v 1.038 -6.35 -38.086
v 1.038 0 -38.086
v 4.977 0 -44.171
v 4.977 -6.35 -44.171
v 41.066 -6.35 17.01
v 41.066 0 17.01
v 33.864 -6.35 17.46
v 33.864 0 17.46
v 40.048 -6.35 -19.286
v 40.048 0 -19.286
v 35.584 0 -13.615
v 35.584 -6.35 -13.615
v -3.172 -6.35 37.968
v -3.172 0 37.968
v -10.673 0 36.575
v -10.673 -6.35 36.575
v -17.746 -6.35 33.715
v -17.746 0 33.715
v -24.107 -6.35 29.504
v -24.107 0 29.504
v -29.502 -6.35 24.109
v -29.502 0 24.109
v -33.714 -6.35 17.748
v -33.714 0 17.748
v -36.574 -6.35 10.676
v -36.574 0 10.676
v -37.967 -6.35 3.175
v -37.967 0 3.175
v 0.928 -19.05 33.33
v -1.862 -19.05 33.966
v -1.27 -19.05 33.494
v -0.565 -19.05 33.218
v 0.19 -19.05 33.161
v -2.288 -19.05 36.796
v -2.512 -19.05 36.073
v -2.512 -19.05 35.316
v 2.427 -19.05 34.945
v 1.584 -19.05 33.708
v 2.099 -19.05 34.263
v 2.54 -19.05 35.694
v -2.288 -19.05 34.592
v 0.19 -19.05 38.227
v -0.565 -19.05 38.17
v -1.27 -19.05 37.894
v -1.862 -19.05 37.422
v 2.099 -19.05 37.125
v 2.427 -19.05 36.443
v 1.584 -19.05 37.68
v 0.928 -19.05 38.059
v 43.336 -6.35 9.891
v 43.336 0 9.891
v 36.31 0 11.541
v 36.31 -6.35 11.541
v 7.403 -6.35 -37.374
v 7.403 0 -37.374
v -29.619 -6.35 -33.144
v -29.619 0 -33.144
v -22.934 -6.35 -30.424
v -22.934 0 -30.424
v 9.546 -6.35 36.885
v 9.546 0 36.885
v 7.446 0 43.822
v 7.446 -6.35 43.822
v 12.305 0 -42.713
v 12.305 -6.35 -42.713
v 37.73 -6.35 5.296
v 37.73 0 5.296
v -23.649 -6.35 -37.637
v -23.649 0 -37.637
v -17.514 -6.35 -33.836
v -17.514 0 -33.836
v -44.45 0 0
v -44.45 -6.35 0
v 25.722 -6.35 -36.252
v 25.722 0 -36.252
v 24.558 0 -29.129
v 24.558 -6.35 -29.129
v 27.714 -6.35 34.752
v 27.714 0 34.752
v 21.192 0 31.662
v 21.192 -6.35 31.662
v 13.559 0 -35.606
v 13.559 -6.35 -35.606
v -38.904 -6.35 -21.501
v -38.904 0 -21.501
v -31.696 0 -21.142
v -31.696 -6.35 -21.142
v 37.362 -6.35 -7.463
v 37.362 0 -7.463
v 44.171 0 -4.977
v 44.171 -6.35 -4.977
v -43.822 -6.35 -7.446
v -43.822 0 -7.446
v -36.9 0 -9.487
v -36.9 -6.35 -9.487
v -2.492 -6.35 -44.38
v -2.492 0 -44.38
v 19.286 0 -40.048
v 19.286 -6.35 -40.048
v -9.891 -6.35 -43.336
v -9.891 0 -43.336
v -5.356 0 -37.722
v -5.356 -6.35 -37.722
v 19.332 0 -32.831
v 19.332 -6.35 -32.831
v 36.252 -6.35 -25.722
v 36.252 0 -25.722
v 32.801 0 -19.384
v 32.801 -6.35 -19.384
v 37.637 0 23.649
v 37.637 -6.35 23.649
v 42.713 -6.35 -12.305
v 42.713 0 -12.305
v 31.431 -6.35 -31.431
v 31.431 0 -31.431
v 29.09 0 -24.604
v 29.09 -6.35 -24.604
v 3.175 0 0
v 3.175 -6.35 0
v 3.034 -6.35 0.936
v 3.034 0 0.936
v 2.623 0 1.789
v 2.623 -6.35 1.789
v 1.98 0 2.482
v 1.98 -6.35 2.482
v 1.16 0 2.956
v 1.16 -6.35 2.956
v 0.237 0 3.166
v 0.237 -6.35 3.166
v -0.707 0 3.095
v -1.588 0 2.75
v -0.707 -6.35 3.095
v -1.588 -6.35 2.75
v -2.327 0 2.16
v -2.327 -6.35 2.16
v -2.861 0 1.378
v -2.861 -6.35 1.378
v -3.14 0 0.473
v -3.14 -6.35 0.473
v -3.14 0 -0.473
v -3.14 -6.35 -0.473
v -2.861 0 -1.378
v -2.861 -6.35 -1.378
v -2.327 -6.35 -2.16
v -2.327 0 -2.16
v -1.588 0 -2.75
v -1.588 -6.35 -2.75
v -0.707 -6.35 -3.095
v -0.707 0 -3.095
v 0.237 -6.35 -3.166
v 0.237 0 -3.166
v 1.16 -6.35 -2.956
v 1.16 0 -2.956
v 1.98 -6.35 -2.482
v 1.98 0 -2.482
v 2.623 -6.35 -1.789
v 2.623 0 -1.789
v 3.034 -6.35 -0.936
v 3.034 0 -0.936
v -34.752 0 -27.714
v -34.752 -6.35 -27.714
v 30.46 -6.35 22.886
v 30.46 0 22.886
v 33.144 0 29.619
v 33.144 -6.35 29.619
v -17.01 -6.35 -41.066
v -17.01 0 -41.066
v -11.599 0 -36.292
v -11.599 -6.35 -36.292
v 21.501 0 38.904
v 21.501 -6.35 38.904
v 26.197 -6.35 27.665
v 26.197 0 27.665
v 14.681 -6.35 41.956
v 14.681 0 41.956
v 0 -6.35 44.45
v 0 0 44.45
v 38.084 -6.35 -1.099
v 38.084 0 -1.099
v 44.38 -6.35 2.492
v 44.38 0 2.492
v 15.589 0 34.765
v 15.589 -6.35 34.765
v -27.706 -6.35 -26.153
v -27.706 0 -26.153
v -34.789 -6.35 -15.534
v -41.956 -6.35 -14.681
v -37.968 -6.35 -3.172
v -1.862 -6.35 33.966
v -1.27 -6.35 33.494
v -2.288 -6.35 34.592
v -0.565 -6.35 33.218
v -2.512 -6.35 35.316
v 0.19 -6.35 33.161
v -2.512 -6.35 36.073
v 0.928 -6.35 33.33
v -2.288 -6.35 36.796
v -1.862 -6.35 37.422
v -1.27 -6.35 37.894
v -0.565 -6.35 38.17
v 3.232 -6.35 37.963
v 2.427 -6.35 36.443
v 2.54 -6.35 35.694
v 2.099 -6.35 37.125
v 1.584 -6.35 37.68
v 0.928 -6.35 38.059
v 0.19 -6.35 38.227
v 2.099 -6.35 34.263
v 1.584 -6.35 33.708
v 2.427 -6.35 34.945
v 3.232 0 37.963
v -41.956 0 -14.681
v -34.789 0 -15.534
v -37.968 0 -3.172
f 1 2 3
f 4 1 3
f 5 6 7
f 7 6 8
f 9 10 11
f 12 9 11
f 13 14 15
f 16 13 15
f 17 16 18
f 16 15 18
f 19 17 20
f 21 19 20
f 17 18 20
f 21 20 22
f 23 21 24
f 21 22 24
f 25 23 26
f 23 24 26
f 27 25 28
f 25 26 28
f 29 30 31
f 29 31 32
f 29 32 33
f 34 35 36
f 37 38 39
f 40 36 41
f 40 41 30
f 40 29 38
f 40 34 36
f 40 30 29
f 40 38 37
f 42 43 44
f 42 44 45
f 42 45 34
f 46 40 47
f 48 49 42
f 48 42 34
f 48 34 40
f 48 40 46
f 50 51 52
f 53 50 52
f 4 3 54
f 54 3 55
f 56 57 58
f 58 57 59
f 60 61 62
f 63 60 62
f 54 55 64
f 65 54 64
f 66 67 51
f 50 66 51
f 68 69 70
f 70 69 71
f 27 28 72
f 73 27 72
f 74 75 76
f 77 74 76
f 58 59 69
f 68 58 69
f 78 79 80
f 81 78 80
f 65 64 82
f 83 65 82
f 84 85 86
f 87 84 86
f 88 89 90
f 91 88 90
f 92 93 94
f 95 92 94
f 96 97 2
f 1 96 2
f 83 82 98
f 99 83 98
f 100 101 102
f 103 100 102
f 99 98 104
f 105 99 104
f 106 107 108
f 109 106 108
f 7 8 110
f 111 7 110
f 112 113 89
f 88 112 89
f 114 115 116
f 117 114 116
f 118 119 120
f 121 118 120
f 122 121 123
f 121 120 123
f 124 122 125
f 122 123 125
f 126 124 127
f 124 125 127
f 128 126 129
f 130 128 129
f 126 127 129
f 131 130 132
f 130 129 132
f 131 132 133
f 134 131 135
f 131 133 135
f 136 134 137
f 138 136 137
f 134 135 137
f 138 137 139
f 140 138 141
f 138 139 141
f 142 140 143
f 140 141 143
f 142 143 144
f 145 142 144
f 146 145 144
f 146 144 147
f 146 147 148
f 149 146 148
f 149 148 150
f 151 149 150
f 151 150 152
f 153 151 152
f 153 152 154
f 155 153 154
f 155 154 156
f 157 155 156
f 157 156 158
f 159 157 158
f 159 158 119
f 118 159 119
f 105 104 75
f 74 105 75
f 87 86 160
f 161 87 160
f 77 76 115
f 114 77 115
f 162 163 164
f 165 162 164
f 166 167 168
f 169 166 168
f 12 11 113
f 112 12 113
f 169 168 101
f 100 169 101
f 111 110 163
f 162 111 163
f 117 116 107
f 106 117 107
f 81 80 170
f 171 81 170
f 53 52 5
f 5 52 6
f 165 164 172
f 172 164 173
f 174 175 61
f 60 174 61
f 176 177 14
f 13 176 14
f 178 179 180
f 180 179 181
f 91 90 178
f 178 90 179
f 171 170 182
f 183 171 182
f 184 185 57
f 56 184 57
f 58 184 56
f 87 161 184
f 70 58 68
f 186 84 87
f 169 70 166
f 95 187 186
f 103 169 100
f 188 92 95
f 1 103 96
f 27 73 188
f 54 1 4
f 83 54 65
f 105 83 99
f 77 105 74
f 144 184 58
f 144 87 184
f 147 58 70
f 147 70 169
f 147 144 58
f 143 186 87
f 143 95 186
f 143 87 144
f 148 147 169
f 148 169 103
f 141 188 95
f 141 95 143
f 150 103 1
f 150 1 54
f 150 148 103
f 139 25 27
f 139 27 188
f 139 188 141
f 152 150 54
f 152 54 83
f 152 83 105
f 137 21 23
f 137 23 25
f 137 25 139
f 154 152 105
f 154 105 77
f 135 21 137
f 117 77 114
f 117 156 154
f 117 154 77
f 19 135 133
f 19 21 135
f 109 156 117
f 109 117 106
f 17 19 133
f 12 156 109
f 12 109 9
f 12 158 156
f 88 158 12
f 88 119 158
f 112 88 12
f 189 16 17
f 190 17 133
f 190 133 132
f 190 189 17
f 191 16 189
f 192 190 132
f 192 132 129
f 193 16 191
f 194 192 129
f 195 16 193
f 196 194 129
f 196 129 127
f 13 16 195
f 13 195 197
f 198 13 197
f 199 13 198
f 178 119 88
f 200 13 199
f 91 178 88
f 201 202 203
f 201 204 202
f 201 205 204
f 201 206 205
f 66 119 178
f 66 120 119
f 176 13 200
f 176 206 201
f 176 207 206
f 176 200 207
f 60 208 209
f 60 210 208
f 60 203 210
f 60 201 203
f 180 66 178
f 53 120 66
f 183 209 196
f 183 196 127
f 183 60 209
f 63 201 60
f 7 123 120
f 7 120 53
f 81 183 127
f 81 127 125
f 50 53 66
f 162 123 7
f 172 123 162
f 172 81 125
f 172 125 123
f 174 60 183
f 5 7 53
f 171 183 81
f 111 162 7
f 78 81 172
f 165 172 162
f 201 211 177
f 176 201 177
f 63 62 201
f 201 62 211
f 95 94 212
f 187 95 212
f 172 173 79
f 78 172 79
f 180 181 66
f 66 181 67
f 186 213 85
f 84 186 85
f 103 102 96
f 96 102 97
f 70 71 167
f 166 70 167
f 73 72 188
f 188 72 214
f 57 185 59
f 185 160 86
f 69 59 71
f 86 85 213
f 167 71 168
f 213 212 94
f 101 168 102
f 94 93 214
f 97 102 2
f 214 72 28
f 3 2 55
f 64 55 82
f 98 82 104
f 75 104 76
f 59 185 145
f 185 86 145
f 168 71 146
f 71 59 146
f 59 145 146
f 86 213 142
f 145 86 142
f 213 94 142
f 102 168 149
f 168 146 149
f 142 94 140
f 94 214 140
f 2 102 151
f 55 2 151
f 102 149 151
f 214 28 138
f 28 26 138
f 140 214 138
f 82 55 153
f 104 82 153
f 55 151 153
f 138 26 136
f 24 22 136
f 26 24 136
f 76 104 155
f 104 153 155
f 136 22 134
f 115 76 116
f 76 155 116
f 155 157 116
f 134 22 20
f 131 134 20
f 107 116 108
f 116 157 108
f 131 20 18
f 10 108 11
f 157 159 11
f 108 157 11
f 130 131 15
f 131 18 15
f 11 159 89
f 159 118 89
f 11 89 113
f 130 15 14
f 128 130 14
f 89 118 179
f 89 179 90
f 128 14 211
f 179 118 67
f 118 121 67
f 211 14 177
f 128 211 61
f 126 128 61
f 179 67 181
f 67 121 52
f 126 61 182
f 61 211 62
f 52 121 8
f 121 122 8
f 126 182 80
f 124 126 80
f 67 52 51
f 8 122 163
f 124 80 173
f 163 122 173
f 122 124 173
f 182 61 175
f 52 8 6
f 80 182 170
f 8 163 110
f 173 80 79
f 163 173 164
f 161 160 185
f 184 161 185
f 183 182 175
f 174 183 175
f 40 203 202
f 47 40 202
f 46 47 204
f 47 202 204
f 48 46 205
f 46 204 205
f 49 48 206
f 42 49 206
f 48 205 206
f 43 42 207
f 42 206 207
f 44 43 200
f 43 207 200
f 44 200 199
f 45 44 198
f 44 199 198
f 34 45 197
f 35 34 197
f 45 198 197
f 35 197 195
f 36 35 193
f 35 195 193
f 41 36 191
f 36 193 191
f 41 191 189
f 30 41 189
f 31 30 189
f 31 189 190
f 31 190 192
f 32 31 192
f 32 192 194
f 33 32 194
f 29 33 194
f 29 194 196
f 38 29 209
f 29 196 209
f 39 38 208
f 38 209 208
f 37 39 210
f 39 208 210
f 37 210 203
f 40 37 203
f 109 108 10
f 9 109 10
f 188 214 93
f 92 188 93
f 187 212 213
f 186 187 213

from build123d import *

# Parameters (mm, degrees)
F1_DEPTH = 6.35
F2_R     = 3.175
F3_DEPTH = 25.4
F4_R     = 2.54
F5_DEPTH = 12.7


with BuildPart() as f1:
    # F0 (on Front) → F1 (new body)
    with BuildSketch(Plane.XZ):
        with BuildLine():
            ThreePointArc((38.0841538474, -1.0987382425), (38.0960382559, -0.5494262521), (38.1, 0))
            ThreePointArc((38.1, 0), (38.0850124652, 1.0685623641), (38.0400616522, 2.1362840397))
            Line((38.0400616522, 2.1362840397), (0, 0))
            Line((0, 0), (37.8604351969, -4.2658465395))
            ThreePointArc((37.8604351969, -4.2658465395), (38.0052995649, -2.6846238059), (38.0841538474, -1.0987382425))
        make_face()
        with BuildLine():
            ThreePointArc((38.0400616522, 2.1362840397), (38.0850124652, 1.0685623641), (38.1, 0))
            ThreePointArc((38.1, 0), (38.0960382559, -0.5494262521), (38.0841538474, -1.0987382425))
            Line((38.0841538474, -1.0987382425), (44.3800719275, 2.4923313797))
            Line((44.3800719275, 2.4923313797), (38.0400616522, 2.1362840397))
        make_face()
        with BuildLine():
            Line((0, 0), (38.0400616522, 2.1362840397))
            ThreePointArc((38.0400616522, 2.1362840397), (37.9180145859, 3.7194313898), (37.7301090364, 5.2961185886))
            ThreePointArc((37.7301090364, 5.2961185886), (37.4712213075, 6.8932991902), (37.1447534541, 8.4780475837))
            Line((37.1447534541, 8.4780475837), (0, 0))
        make_face()
        with BuildLine():
            ThreePointArc((37.7301090364, 5.2961185886), (37.9180145859, 3.7194313898), (38.0400616522, 2.1362840397))
            Line((38.0400616522, 2.1362840397), (44.3800719275, 2.4923313797))
            Line((44.3800719275, 2.4923313797), (37.7301090364, 5.2961185886))
        make_face()
        with BuildLine():
            Line((44.1705077298, -4.9768209628), (38.0841538474, -1.0987382425))
            ThreePointArc((38.0841538474, -1.0987382425), (38.0052995649, -2.6846238059), (37.8604351969, -4.2658465395))
            Line((37.8604351969, -4.2658465395), (44.1705077298, -4.9768209628))
        make_face()
        with BuildLine():
            ThreePointArc((37.1447534541, 8.4780475837), (37.4712213075, 6.8932991902), (37.7301090364, 5.2961185886))
            Line((37.7301090364, 5.2961185886), (43.3355456965, 9.8910555144))
            Line((43.3355456965, 9.8910555144), (37.1447534541, 8.4780475837))
        make_face()
        with BuildLine():
            Line((-37.5616858055, -6.3819871079), (0, 0))
            Line((0, 0), (6.3819871079, 37.5616858055))
            ThreePointArc((6.3819871079, 37.5616858055), (4.8113745401, 37.794982141), (3.2324052628, 37.9626336839))
            ThreePointArc((3.2324052628, 37.9626336839), (1.6176613743, 38.06564293), (0, 38.1))
            ThreePointArc((0, 38.1), (-1.5875, 38.0669127163), (-3.1722427264, 37.9677083333))
            ThreePointArc((-3.1722427264, 37.9677083333), (-26.9397901024, 26.9417465885), (-37.9674778593, 3.175))
            ThreePointArc((-37.9674778593, 3.175), (-38.0668550477, 1.5888822422), (-38.1, 0))
            ThreePointArc((-38.1, 0), (-38.0669127163, -1.5875), (-37.9677083333, -3.1722427264))
            ThreePointArc((-37.9677083333, -3.1722427264), (-37.7987825134, -4.7814266182), (-37.5616858055, -6.3819871079))
        make_face()
        with BuildLine():
            Line((6.3819871079, 37.5616858055), (0, 0))
            Line((0, 0), (12.5836322605, 35.9619548847))
            ThreePointArc((12.5836322605, 35.9619548847), (11.0742894366, 36.4550423601), (9.5457120638, 36.8848123378))
            ThreePointArc((9.5457120638, 36.8848123378), (7.9710375516, 37.2568458186), (6.3819871079, 37.5616858055))
        make_face()
        with BuildLine():
            Line((12.5836322605, 35.9619548847), (0, 0))
            Line((0, 0), (18.4296895987, 33.3460123747))
            ThreePointArc((18.4296895987, 33.3460123747), (17.0242674724, 34.0849573423), (15.5892764868, 34.7647013308))
            ThreePointArc((15.5892764868, 34.7647013308), (14.099168445, 35.3952461379), (12.5836322605, 35.9619548847))
        make_face()
        with BuildLine():
            Line((18.4296895987, 33.3460123747), (0, 0))
            Line((0, 0), (23.7549614508, 29.787779482))
            ThreePointArc((23.7549614508, 29.787779482), (22.4931743884, 30.7517008624), (21.1923197123, 31.6622106811))
            ThreePointArc((21.1923197123, 31.6622106811), (19.8288855586, 32.5334489027), (18.4296895987, 33.3460123747))
        make_face()
        with BuildLine():
            Line((23.7549614508, 29.787779482), (0, 0))
            Line((0, 0), (28.408966482, 25.38780462))
            ThreePointArc((28.408966482, 25.38780462), (27.3264700157, 26.5494639585), (26.1965111522, 27.6650104546))
            ThreePointArc((26.1965111522, 27.6650104546), (24.9982787585, 28.7523226733), (23.7549614508, 29.787779482))
        make_face()
        with BuildLine():
            Line((28.408966482, 25.38780462), (0, 0))
            Line((0, 0), (32.2601919906, 20.2704221152))
            ThreePointArc((32.2601919906, 20.2704221152), (31.3875752653, 21.5969932853), (30.4604425502, 22.8860533873))
            ThreePointArc((30.4604425502, 22.8860533873), (29.4612715231, 24.1587143748), (28.408966482, 25.38780462))
        make_face()
        with BuildLine():
            Line((32.2601919906, 20.2704221152), (0, 0))
            Line((0, 0), (35.1998101887, 14.5802387731))
            ThreePointArc((35.1998101887, 14.5802387731), (34.5617315756, 16.0342355757), (33.8636238907, 17.4603830711))
            ThreePointArc((33.8636238907, 17.4603830711), (33.0917487681, 18.8824300202), (32.2601919906, 20.2704221152))
        make_face()
        with BuildLine():
            Line((35.1998101887, 14.5802387731), (0, 0))
            Line((0, 0), (37.1447534541, 8.4780475837))
            ThreePointArc((37.1447534541, 8.4780475837), (36.759243755, 10.0183830311), (36.3098882015, 11.5413178967))
            ThreePointArc((36.3098882015, 11.5413178967), (35.7871206021, 13.0725666574), (35.1998101887, 14.5802387731))
        make_face()
        with BuildLine():
            Line((37.8604351969, -4.2658465395), (0, 0))
            Line((0, 0), (36.6109499661, -10.5474329853))
            ThreePointArc((36.6109499661, -10.5474329853), (37.0186321964, -9.0128170016), (37.3620180496, -7.4625469689))
            ThreePointArc((37.3620180496, -7.4625469689), (37.6451735487, -5.8694896273), (37.8604351969, -4.2658465395))
        make_face()
        with BuildLine():
            Line((36.6109499661, -10.5474329853), (0, 0))
            Line((0, 0), (34.3269138671, -16.5309704604))
            ThreePointArc((34.3269138671, -16.5309704604), (34.9858936904, -15.0863263482), (35.5841077294, -13.6154793195))
            ThreePointArc((35.5841077294, -13.6154793195), (36.1301095486, -12.0923605639), (36.6109499661, -10.5474329853))
        make_face()
        with BuildLine():
            Line((34.3269138671, -16.5309704604), (0, 0))
            Line((0, 0), (31.0728691073, -22.0473763845))
            ThreePointArc((31.0728691073, -22.0473763845), (31.9645250962, -20.7335268436), (32.800663011, -19.3836659598))
            ThreePointArc((32.800663011, -19.3836659598), (33.5940822509, -17.9735260235), (34.3269138671, -16.5309704604))
        make_face()
        with BuildLine():
            Line((31.0728691073, -22.0473763845), (0, 0))
            Line((0, 0), (26.9407683632, -26.9407683632))
            ThreePointArc((26.9407683632, -26.9407683632), (28.0399041357, -25.7948401054), (29.090338372, -24.6041096852))
            ThreePointArc((29.090338372, -24.6041096852), (30.1087546213, -23.3467962504), (31.0728691073, -22.0473763845))
        make_face()
        with BuildLine():
            Line((26.9407683632, -26.9407683632), (0, 0))
            Line((0, 0), (22.0473763845, -31.0728691073))
            ThreePointArc((22.0473763845, -31.0728691073), (23.3229326026, -30.1272437308), (24.5579800287, -29.1292913905))
            ThreePointArc((24.5579800287, -29.1292913905), (25.7726149186, -28.0603335735), (26.9407683632, -26.9407683632))
        make_face()
        with BuildLine():
            Line((22.0473763845, -31.0728691073), (0, 0))
            Line((0, 0), (16.5309704604, -34.3269138671))
            ThreePointArc((16.5309704604, -34.3269138671), (17.9469025038, -33.6083128187), (19.3316631953, -32.8313386584))
            ThreePointArc((19.3316631953, -32.8313386584), (20.7081936181, -31.9809430298), (22.0473763845, -31.0728691073))
        make_face()
        with BuildLine():
            Line((16.5309704604, -34.3269138671), (0, 0))
            Line((0, 0), (10.5474329853, -36.6109499661))
            ThreePointArc((10.5474329853, -36.6109499661), (12.0637294988, -36.1396794477), (13.5590729393, -35.6056391745))
            ThreePointArc((13.5590729393, -35.6056391745), (15.0586009493, -34.9978361824), (16.5309704604, -34.3269138671))
        make_face()
        with BuildLine():
            Line((10.5474329853, -36.6109499661), (0, 0))
            Line((0, 0), (4.2658465395, -37.8604351969))
            ThreePointArc((4.2658465395, -37.8604351969), (5.8396600724, -37.6498123533), (7.4033309023, -37.3737968576))
            ThreePointArc((7.4033309023, -37.3737968576), (8.9834828926, -37.0257617763), (10.5474329853, -36.6109499661))
        make_face()
        with BuildLine():
            Line((4.2658465395, -37.8604351969), (0, 0))
            Line((0, 0), (-2.1362840397, -38.0400616522))
            ThreePointArc((-2.1362840397, -38.0400616522), (-0.5494262521, -38.0960382559), (1.0383858149, -38.0858471732))
            ThreePointArc((1.0383858149, -38.0858471732), (2.6545099091, -38.0074147653), (4.2658465395, -37.8604351969))
        make_face()
        with BuildLine():
            Line((-2.1362840397, -38.0400616522), (0, 0))
            Line((0, 0), (-8.4780475837, -37.1447534541))
            ThreePointArc((-8.4780475837, -37.1447534541), (-6.9229869099, -37.4657477204), (-5.3559019404, -37.72166903))
            ThreePointArc((-5.3559019404, -37.72166903), (-3.7494741172, -37.9150556355), (-2.1362840397, -38.0400616522))
        make_face()
        with BuildLine():
            Line((-8.4780475837, -37.1447534541), (0, 0))
            Line((0, 0), (-14.5802387731, -35.1998101887))
            ThreePointArc((-14.5802387731, -35.1998101887), (-13.10091806, -35.7767514734), (-11.598842817, -36.2915533603))
            ThreePointArc((-11.598842817, -36.2915533603), (-10.0475056427, -36.7512942678), (-8.4780475837, -37.1447534541))
        make_face()
        with BuildLine():
            Line((-14.5802387731, -35.1998101887), (0, 0))
            Line((0, 0), (-20.2704221152, -32.2601919906))
            ThreePointArc((-20.2704221152, -32.2601919906), (-18.9086439527, -33.0767771083), (-17.5140240229, -33.83591232))
            ThreePointArc((-17.5140240229, -33.83591232), (-16.0616151259, -34.5490161878), (-14.5802387731, -35.1998101887))
        make_face()
        with BuildLine():
            Line((-20.2704221152, -32.2601919906), (0, 0))
            Line((0, 0), (-25.38780462, -28.408966482))
            ThreePointArc((-25.38780462, -28.408966482), (-24.1820500849, -29.4421204007), (-22.9342945866, -30.4241373225))
            ThreePointArc((-22.9342945866, -30.4241373225), (-21.6218560838, -31.370453288), (-20.2704221152, -32.2601919906))
        make_face()
        with BuildLine():
            Line((-25.38780462, -28.408966482), (0, 0))
            Line((0, 0), (-29.787779482, -23.7549614508))
            ThreePointArc((-29.787779482, -23.7549614508), (-28.7721207415, -24.9754893453), (-27.7064887033, -26.1526381793))
            ThreePointArc((-27.7064887033, -26.1526381793), (-26.5711074332, -27.305425281), (-25.38780462, -28.408966482))
        make_face()
        with BuildLine():
            Line((-29.787779482, -23.7549614508), (0, 0))
            Line((0, 0), (-33.3460123747, -18.4296895987))
            ThreePointArc((-33.3460123747, -18.4296895987), (-32.5491498758, -19.8031018369), (-31.6957538883, -21.142118755))
            ThreePointArc((-31.6957538883, -21.142118755), (-30.7695134129, -22.4688015777), (-29.787779482, -23.7549614508))
        make_face()
        with BuildLine():
            Line((-33.3460123747, -18.4296895987), (0, 0))
            Line((0, 0), (-35.9619548847, -12.5836322605))
            ThreePointArc((-35.9619548847, -12.5836322605), (-35.4064063384, -14.0711190103), (-34.7893616339, -15.534166122))
            ThreePointArc((-34.7893616339, -15.534166122), (-34.0984356221, -16.9972553115), (-33.3460123747, -18.4296895987))
        make_face()
        with BuildLine():
            Line((-35.9619548847, -12.5836322605), (0, 0))
            Line((0, 0), (-37.5616858055, -6.3819871079))
            ThreePointArc((-37.5616858055, -6.3819871079), (-37.263149882, -7.9415150239), (-36.8998928869, -9.4872495981))
            ThreePointArc((-36.8998928869, -9.4872495981), (-36.4638055004, -11.0454012343), (-35.9619548847, -12.5836322605))
        make_face()
        with BuildLine():
            Line((44.1705077298, -4.9768209628), (37.8604351969, -4.2658465395))
            ThreePointArc((37.8604351969, -4.2658465395), (37.6451735487, -5.8694896273), (37.3620180496, -7.4625469689))
            Line((37.3620180496, -7.4625469689), (44.1705077298, -4.9768209628))
        make_face()
        with BuildLine():
            ThreePointArc((36.3098882015, 11.5413178967), (36.759243755, 10.0183830311), (37.1447534541, 8.4780475837))
            Line((37.1447534541, 8.4780475837), (43.3355456965, 9.8910555144))
            Line((43.3355456965, 9.8910555144), (36.3098882015, 11.5413178967))
        make_face()
        with BuildLine():
            Line((7.4456516259, 43.8219667731), (6.3819871079, 37.5616858055))
            ThreePointArc((6.3819871079, 37.5616858055), (7.9710375516, 37.2568458186), (9.5457120638, 36.8848123378))
            Line((9.5457120638, 36.8848123378), (7.4456516259, 43.8219667731))
        make_face()
        with BuildLine():
            ThreePointArc((3.2324052628, 37.9626336839), (4.8113745401, 37.794982141), (6.3819871079, 37.5616858055))
            Line((6.3819871079, 37.5616858055), (7.4456516259, 43.8219667731))
            Line((7.4456516259, 43.8219667731), (3.2324052628, 37.9626336839))
        make_face()
        with BuildLine():
            Line((14.6809043039, 41.9556140322), (12.5836322605, 35.9619548847))
            ThreePointArc((12.5836322605, 35.9619548847), (14.099168445, 35.3952461379), (15.5892764868, 34.7647013308))
            Line((15.5892764868, 34.7647013308), (14.6809043039, 41.9556140322))
        make_face()
        with BuildLine():
            ThreePointArc((9.5457120638, 36.8848123378), (11.0742894366, 36.4550423601), (12.5836322605, 35.9619548847))
            Line((12.5836322605, 35.9619548847), (14.6809043039, 41.9556140322))
            Line((14.6809043039, 41.9556140322), (9.5457120638, 36.8848123378))
        make_face()
        with BuildLine():
            Line((21.5013045318, 38.9036811038), (18.4296895987, 33.3460123747))
            ThreePointArc((18.4296895987, 33.3460123747), (19.8288855586, 32.5334489027), (21.1923197123, 31.6622106811))
            Line((21.1923197123, 31.6622106811), (21.5013045318, 38.9036811038))
        make_face()
        with BuildLine():
            ThreePointArc((15.5892764868, 34.7647013308), (17.0242674724, 34.0849573423), (18.4296895987, 33.3460123747))
            Line((18.4296895987, 33.3460123747), (21.5013045318, 38.9036811038))
            Line((21.5013045318, 38.9036811038), (15.5892764868, 34.7647013308))
        make_face()
        with BuildLine():
            Line((27.7141216926, 34.7524093957), (23.7549614508, 29.787779482))
            ThreePointArc((23.7549614508, 29.787779482), (24.9982787585, 28.7523226733), (26.1965111522, 27.6650104546))
            Line((26.1965111522, 27.6650104546), (27.7141216926, 34.7524093957))
        make_face()
        with BuildLine():
            ThreePointArc((21.1923197123, 31.6622106811), (22.4931743884, 30.7517008624), (23.7549614508, 29.787779482))
            Line((23.7549614508, 29.787779482), (27.7141216926, 34.7524093957))
            Line((27.7141216926, 34.7524093957), (21.1923197123, 31.6622106811))
        make_face()
        with BuildLine():
            Line((33.1437942291, 29.61910539), (28.408966482, 25.38780462))
            ThreePointArc((28.408966482, 25.38780462), (29.4612715231, 24.1587143748), (30.4604425502, 22.8860533873))
            Line((30.4604425502, 22.8860533873), (33.1437942291, 29.61910539))
        make_face()
        with BuildLine():
            ThreePointArc((26.1965111522, 27.6650104546), (27.3264700157, 26.5494639585), (28.408966482, 25.38780462))
            Line((28.408966482, 25.38780462), (33.1437942291, 29.61910539))
            Line((33.1437942291, 29.61910539), (26.1965111522, 27.6650104546))
        make_face()
        with BuildLine():
            Line((37.6368906557, 23.6488258011), (32.2601919906, 20.2704221152))
            ThreePointArc((32.2601919906, 20.2704221152), (33.0917487681, 18.8824300202), (33.8636238907, 17.4603830711))
            Line((33.8636238907, 17.4603830711), (37.6368906557, 23.6488258011))
        make_face()
        with BuildLine():
            ThreePointArc((30.4604425502, 22.8860533873), (31.3875752653, 21.5969932853), (32.2601919906, 20.2704221152))
            Line((32.2601919906, 20.2704221152), (37.6368906557, 23.6488258011))
            Line((37.6368906557, 23.6488258011), (30.4604425502, 22.8860533873))
        make_face()
        with BuildLine():
            Line((41.0664452201, 17.0102785686), (35.1998101887, 14.5802387731))
            ThreePointArc((35.1998101887, 14.5802387731), (35.7871206021, 13.0725666574), (36.3098882015, 11.5413178967))
            Line((36.3098882015, 11.5413178967), (41.0664452201, 17.0102785686))
        make_face()
        with BuildLine():
            ThreePointArc((33.8636238907, 17.4603830711), (34.5617315756, 16.0342355757), (35.1998101887, 14.5802387731))
            Line((35.1998101887, 14.5802387731), (41.0664452201, 17.0102785686))
            Line((41.0664452201, 17.0102785686), (33.8636238907, 17.4603830711))
        make_face()
        with BuildLine():
            Line((42.7127749605, -12.3053384828), (36.6109499661, -10.5474329853))
            ThreePointArc((36.6109499661, -10.5474329853), (36.1301095486, -12.0923605639), (35.5841077294, -13.6154793195))
            Line((35.5841077294, -13.6154793195), (42.7127749605, -12.3053384828))
        make_face()
        with BuildLine():
            ThreePointArc((37.3620180496, -7.4625469689), (37.0186321964, -9.0128170016), (36.6109499661, -10.5474329853))
            Line((36.6109499661, -10.5474329853), (42.7127749605, -12.3053384828))
            Line((42.7127749605, -12.3053384828), (37.3620180496, -7.4625469689))
        make_face()
        with BuildLine():
            Line((40.0480661783, -19.2861322038), (34.3269138671, -16.5309704604))
            ThreePointArc((34.3269138671, -16.5309704604), (33.5940822509, -17.9735260235), (32.800663011, -19.3836659598))
            Line((32.800663011, -19.3836659598), (40.0480661783, -19.2861322038))
        make_face()
        with BuildLine():
            ThreePointArc((35.5841077294, -13.6154793195), (34.9858936904, -15.0863263482), (34.3269138671, -16.5309704604))
            Line((34.3269138671, -16.5309704604), (40.0480661783, -19.2861322038))
            Line((40.0480661783, -19.2861322038), (35.5841077294, -13.6154793195))
        make_face()
        with BuildLine():
            Line((36.2516806252, -25.7219391152), (31.0728691073, -22.0473763845))
            ThreePointArc((31.0728691073, -22.0473763845), (30.1087546213, -23.3467962504), (29.090338372, -24.6041096852))
            Line((29.090338372, -24.6041096852), (36.2516806252, -25.7219391152))
        make_face()
        with BuildLine():
            ThreePointArc((32.800663011, -19.3836659598), (31.9645250962, -20.7335268436), (31.0728691073, -22.0473763845))
            Line((31.0728691073, -22.0473763845), (36.2516806252, -25.7219391152))
            Line((36.2516806252, -25.7219391152), (32.800663011, -19.3836659598))
        make_face()
        with BuildLine():
            Line((31.4308964237, -31.4308964237), (26.9407683632, -26.9407683632))
            ThreePointArc((26.9407683632, -26.9407683632), (25.7726149186, -28.0603335735), (24.5579800287, -29.1292913905))
            Line((24.5579800287, -29.1292913905), (31.4308964237, -31.4308964237))
        make_face()
        with BuildLine():
            ThreePointArc((29.090338372, -24.6041096852), (28.0399041357, -25.7948401054), (26.9407683632, -26.9407683632))
            Line((26.9407683632, -26.9407683632), (31.4308964237, -31.4308964237))
            Line((31.4308964237, -31.4308964237), (29.090338372, -24.6041096852))
        make_face()
        with BuildLine():
            Line((25.7219391152, -36.2516806252), (22.0473763845, -31.0728691073))
            ThreePointArc((22.0473763845, -31.0728691073), (20.7081936181, -31.9809430298), (19.3316631953, -32.8313386584))
            Line((19.3316631953, -32.8313386584), (25.7219391152, -36.2516806252))
        make_face()
        with BuildLine():
            ThreePointArc((24.5579800287, -29.1292913905), (23.3229326026, -30.1272437308), (22.0473763845, -31.0728691073))
            Line((22.0473763845, -31.0728691073), (25.7219391152, -36.2516806252))
            Line((25.7219391152, -36.2516806252), (24.5579800287, -29.1292913905))
        make_face()
        with BuildLine():
            Line((19.2861322038, -40.0480661783), (16.5309704604, -34.3269138671))
            ThreePointArc((16.5309704604, -34.3269138671), (15.0586009493, -34.9978361824), (13.5590729393, -35.6056391745))
            Line((13.5590729393, -35.6056391745), (19.2861322038, -40.0480661783))
        make_face()
        with BuildLine():
            ThreePointArc((19.3316631953, -32.8313386584), (17.9469025038, -33.6083128187), (16.5309704604, -34.3269138671))
            Line((16.5309704604, -34.3269138671), (19.2861322038, -40.0480661783))
            Line((19.2861322038, -40.0480661783), (19.3316631953, -32.8313386584))
        make_face()
        with BuildLine():
            Line((12.3053384828, -42.7127749605), (10.5474329853, -36.6109499661))
            ThreePointArc((10.5474329853, -36.6109499661), (8.9834828926, -37.0257617763), (7.4033309023, -37.3737968576))
            Line((7.4033309023, -37.3737968576), (12.3053384828, -42.7127749605))
        make_face()
        with BuildLine():
            ThreePointArc((13.5590729393, -35.6056391745), (12.0637294988, -36.1396794477), (10.5474329853, -36.6109499661))
            Line((10.5474329853, -36.6109499661), (12.3053384828, -42.7127749605))
            Line((12.3053384828, -42.7127749605), (13.5590729393, -35.6056391745))
        make_face()
        with BuildLine():
            Line((4.9768209628, -44.1705077298), (4.2658465395, -37.8604351969))
            ThreePointArc((4.2658465395, -37.8604351969), (2.6545099091, -38.0074147653), (1.0383858149, -38.0858471732))
            Line((1.0383858149, -38.0858471732), (4.9768209628, -44.1705077298))
        make_face()
        with BuildLine():
            ThreePointArc((7.4033309023, -37.3737968576), (5.8396600724, -37.6498123533), (4.2658465395, -37.8604351969))
            Line((4.2658465395, -37.8604351969), (4.9768209628, -44.1705077298))
            Line((4.9768209628, -44.1705077298), (7.4033309023, -37.3737968576))
        make_face()
        with BuildLine():
            Line((-2.4923313797, -44.3800719275), (-2.1362840397, -38.0400616522))
            ThreePointArc((-2.1362840397, -38.0400616522), (-3.7494741172, -37.9150556355), (-5.3559019404, -37.72166903))
            Line((-5.3559019404, -37.72166903), (-2.4923313797, -44.3800719275))
        make_face()
        with BuildLine():
            ThreePointArc((1.0383858149, -38.0858471732), (-0.5494262521, -38.0960382559), (-2.1362840397, -38.0400616522))
            Line((-2.1362840397, -38.0400616522), (-2.4923313797, -44.3800719275))
            Line((-2.4923313797, -44.3800719275), (1.0383858149, -38.0858471732))
        make_face()
        with BuildLine():
            Line((-9.8910555144, -43.3355456965), (-8.4780475837, -37.1447534541))
            ThreePointArc((-8.4780475837, -37.1447534541), (-10.0475056427, -36.7512942678), (-11.598842817, -36.2915533603))
            Line((-11.598842817, -36.2915533603), (-9.8910555144, -43.3355456965))
        make_face()
        with BuildLine():
            ThreePointArc((-5.3559019404, -37.72166903), (-6.9229869099, -37.4657477204), (-8.4780475837, -37.1447534541))
            Line((-8.4780475837, -37.1447534541), (-9.8910555144, -43.3355456965))
            Line((-9.8910555144, -43.3355456965), (-5.3559019404, -37.72166903))
        make_face()
        with BuildLine():
            Line((-17.0102785686, -41.0664452201), (-14.5802387731, -35.1998101887))
            ThreePointArc((-14.5802387731, -35.1998101887), (-16.0616151259, -34.5490161878), (-17.5140240229, -33.83591232))
            Line((-17.5140240229, -33.83591232), (-17.0102785686, -41.0664452201))
        make_face()
        with BuildLine():
            ThreePointArc((-11.598842817, -36.2915533603), (-13.10091806, -35.7767514734), (-14.5802387731, -35.1998101887))
            Line((-14.5802387731, -35.1998101887), (-17.0102785686, -41.0664452201))
            Line((-17.0102785686, -41.0664452201), (-11.598842817, -36.2915533603))
        make_face()
        with BuildLine():
            Line((-23.6488258011, -37.6368906557), (-20.2704221152, -32.2601919906))
            ThreePointArc((-20.2704221152, -32.2601919906), (-21.6218560838, -31.370453288), (-22.9342945866, -30.4241373225))
            Line((-22.9342945866, -30.4241373225), (-23.6488258011, -37.6368906557))
        make_face()
        with BuildLine():
            ThreePointArc((-17.5140240229, -33.83591232), (-18.9086439527, -33.0767771083), (-20.2704221152, -32.2601919906))
            Line((-20.2704221152, -32.2601919906), (-23.6488258011, -37.6368906557))
            Line((-23.6488258011, -37.6368906557), (-17.5140240229, -33.83591232))
        make_face()
        with BuildLine():
            Line((-29.61910539, -33.1437942291), (-25.38780462, -28.408966482))
            ThreePointArc((-25.38780462, -28.408966482), (-26.5711074332, -27.305425281), (-27.7064887033, -26.1526381793))
            Line((-27.7064887033, -26.1526381793), (-29.61910539, -33.1437942291))
        make_face()
        with BuildLine():
            ThreePointArc((-22.9342945866, -30.4241373225), (-24.1820500849, -29.4421204007), (-25.38780462, -28.408966482))
            Line((-25.38780462, -28.408966482), (-29.61910539, -33.1437942291))
            Line((-29.61910539, -33.1437942291), (-22.9342945866, -30.4241373225))
        make_face()
        with BuildLine():
            Line((-34.7524093957, -27.7141216926), (-29.787779482, -23.7549614508))
            ThreePointArc((-29.787779482, -23.7549614508), (-30.7695134129, -22.4688015777), (-31.6957538883, -21.142118755))
            Line((-31.6957538883, -21.142118755), (-34.7524093957, -27.7141216926))
        make_face()
        with BuildLine():
            ThreePointArc((-27.7064887033, -26.1526381793), (-28.7721207415, -24.9754893453), (-29.787779482, -23.7549614508))
            Line((-29.787779482, -23.7549614508), (-34.7524093957, -27.7141216926))
            Line((-34.7524093957, -27.7141216926), (-27.7064887033, -26.1526381793))
        make_face()
        with BuildLine():
            Line((-38.9036811038, -21.5013045318), (-33.3460123747, -18.4296895987))
            ThreePointArc((-33.3460123747, -18.4296895987), (-34.0984356221, -16.9972553115), (-34.7893616339, -15.534166122))
            Line((-34.7893616339, -15.534166122), (-38.9036811038, -21.5013045318))
        make_face()
        with BuildLine():
            ThreePointArc((-31.6957538883, -21.142118755), (-32.5491498758, -19.8031018369), (-33.3460123747, -18.4296895987))
            Line((-33.3460123747, -18.4296895987), (-38.9036811038, -21.5013045318))
            Line((-38.9036811038, -21.5013045318), (-31.6957538883, -21.142118755))
        make_face()
        with BuildLine():
            Line((-41.9556140322, -14.6809043039), (-35.9619548847, -12.5836322605))
            ThreePointArc((-35.9619548847, -12.5836322605), (-36.4638055004, -11.0454012343), (-36.8998928869, -9.4872495981))
            Line((-36.8998928869, -9.4872495981), (-41.9556140322, -14.6809043039))
        make_face()
        with BuildLine():
            ThreePointArc((-34.7893616339, -15.534166122), (-35.4064063384, -14.0711190103), (-35.9619548847, -12.5836322605))
            Line((-35.9619548847, -12.5836322605), (-41.9556140322, -14.6809043039))
            Line((-41.9556140322, -14.6809043039), (-34.7893616339, -15.534166122))
        make_face()
        with BuildLine():
            Line((-43.8219667731, -7.4456516259), (-37.5616858055, -6.3819871079))
            ThreePointArc((-37.5616858055, -6.3819871079), (-37.7987825134, -4.7814266182), (-37.9677083333, -3.1722427264))
            Line((-37.9677083333, -3.1722427264), (-43.8219667731, -7.4456516259))
        make_face()
        with BuildLine():
            ThreePointArc((-36.8998928869, -9.4872495981), (-37.263149882, -7.9415150239), (-37.5616858055, -6.3819871079))
            Line((-37.5616858055, -6.3819871079), (-43.8219667731, -7.4456516259))
            Line((-43.8219667731, -7.4456516259), (-36.8998928869, -9.4872495981))
        make_face()
        with BuildLine():
            ThreePointArc((0, 38.1), (1.6176613743, 38.06564293), (3.2324052628, 37.9626336839))
            Line((3.2324052628, 37.9626336839), (0, 44.45))
            Line((0, 44.45), (0, 38.1))
        make_face()
        with BuildLine():
            Line((-44.45, 0), (-37.9677083333, -3.1722427264))
            ThreePointArc((-37.9677083333, -3.1722427264), (-38.0669127163, -1.5875), (-38.1, 0))
            Line((-38.1, 0), (-44.45, 0))
        make_face()
        with BuildLine():
            ThreePointArc((-3.1722427264, 37.9677083333), (-1.5875, 38.0669127163), (0, 38.1))
            Line((0, 38.1), (0, 44.45))
            Line((0, 44.45), (-3.1722427264, 37.9677083333))
        make_face()
        with BuildLine():
            Line((-44.45, 0), (-38.1, 0))
            ThreePointArc((-38.1, 0), (-38.0668550477, 1.5888822422), (-37.9674778593, 3.175))
            Line((-37.9674778593, 3.175), (-44.45, 0))
        make_face()
    extrude(amount=F1_DEPTH)

    # F2 (on face) → F3 (cut)
    with BuildSketch(Plane.XZ.offset(6.35)):
        Circle(F2_R)
    extrude(amount=-F3_DEPTH, mode=Mode.SUBTRACT)

    # F4 (on face) → F5 (join)
    with BuildSketch(Plane.XZ.offset(6.35)):
        with Locations((0, 35.6941140311)):
            Circle(F4_R)
    extrude(amount=F5_DEPTH)


solid = f1.part
